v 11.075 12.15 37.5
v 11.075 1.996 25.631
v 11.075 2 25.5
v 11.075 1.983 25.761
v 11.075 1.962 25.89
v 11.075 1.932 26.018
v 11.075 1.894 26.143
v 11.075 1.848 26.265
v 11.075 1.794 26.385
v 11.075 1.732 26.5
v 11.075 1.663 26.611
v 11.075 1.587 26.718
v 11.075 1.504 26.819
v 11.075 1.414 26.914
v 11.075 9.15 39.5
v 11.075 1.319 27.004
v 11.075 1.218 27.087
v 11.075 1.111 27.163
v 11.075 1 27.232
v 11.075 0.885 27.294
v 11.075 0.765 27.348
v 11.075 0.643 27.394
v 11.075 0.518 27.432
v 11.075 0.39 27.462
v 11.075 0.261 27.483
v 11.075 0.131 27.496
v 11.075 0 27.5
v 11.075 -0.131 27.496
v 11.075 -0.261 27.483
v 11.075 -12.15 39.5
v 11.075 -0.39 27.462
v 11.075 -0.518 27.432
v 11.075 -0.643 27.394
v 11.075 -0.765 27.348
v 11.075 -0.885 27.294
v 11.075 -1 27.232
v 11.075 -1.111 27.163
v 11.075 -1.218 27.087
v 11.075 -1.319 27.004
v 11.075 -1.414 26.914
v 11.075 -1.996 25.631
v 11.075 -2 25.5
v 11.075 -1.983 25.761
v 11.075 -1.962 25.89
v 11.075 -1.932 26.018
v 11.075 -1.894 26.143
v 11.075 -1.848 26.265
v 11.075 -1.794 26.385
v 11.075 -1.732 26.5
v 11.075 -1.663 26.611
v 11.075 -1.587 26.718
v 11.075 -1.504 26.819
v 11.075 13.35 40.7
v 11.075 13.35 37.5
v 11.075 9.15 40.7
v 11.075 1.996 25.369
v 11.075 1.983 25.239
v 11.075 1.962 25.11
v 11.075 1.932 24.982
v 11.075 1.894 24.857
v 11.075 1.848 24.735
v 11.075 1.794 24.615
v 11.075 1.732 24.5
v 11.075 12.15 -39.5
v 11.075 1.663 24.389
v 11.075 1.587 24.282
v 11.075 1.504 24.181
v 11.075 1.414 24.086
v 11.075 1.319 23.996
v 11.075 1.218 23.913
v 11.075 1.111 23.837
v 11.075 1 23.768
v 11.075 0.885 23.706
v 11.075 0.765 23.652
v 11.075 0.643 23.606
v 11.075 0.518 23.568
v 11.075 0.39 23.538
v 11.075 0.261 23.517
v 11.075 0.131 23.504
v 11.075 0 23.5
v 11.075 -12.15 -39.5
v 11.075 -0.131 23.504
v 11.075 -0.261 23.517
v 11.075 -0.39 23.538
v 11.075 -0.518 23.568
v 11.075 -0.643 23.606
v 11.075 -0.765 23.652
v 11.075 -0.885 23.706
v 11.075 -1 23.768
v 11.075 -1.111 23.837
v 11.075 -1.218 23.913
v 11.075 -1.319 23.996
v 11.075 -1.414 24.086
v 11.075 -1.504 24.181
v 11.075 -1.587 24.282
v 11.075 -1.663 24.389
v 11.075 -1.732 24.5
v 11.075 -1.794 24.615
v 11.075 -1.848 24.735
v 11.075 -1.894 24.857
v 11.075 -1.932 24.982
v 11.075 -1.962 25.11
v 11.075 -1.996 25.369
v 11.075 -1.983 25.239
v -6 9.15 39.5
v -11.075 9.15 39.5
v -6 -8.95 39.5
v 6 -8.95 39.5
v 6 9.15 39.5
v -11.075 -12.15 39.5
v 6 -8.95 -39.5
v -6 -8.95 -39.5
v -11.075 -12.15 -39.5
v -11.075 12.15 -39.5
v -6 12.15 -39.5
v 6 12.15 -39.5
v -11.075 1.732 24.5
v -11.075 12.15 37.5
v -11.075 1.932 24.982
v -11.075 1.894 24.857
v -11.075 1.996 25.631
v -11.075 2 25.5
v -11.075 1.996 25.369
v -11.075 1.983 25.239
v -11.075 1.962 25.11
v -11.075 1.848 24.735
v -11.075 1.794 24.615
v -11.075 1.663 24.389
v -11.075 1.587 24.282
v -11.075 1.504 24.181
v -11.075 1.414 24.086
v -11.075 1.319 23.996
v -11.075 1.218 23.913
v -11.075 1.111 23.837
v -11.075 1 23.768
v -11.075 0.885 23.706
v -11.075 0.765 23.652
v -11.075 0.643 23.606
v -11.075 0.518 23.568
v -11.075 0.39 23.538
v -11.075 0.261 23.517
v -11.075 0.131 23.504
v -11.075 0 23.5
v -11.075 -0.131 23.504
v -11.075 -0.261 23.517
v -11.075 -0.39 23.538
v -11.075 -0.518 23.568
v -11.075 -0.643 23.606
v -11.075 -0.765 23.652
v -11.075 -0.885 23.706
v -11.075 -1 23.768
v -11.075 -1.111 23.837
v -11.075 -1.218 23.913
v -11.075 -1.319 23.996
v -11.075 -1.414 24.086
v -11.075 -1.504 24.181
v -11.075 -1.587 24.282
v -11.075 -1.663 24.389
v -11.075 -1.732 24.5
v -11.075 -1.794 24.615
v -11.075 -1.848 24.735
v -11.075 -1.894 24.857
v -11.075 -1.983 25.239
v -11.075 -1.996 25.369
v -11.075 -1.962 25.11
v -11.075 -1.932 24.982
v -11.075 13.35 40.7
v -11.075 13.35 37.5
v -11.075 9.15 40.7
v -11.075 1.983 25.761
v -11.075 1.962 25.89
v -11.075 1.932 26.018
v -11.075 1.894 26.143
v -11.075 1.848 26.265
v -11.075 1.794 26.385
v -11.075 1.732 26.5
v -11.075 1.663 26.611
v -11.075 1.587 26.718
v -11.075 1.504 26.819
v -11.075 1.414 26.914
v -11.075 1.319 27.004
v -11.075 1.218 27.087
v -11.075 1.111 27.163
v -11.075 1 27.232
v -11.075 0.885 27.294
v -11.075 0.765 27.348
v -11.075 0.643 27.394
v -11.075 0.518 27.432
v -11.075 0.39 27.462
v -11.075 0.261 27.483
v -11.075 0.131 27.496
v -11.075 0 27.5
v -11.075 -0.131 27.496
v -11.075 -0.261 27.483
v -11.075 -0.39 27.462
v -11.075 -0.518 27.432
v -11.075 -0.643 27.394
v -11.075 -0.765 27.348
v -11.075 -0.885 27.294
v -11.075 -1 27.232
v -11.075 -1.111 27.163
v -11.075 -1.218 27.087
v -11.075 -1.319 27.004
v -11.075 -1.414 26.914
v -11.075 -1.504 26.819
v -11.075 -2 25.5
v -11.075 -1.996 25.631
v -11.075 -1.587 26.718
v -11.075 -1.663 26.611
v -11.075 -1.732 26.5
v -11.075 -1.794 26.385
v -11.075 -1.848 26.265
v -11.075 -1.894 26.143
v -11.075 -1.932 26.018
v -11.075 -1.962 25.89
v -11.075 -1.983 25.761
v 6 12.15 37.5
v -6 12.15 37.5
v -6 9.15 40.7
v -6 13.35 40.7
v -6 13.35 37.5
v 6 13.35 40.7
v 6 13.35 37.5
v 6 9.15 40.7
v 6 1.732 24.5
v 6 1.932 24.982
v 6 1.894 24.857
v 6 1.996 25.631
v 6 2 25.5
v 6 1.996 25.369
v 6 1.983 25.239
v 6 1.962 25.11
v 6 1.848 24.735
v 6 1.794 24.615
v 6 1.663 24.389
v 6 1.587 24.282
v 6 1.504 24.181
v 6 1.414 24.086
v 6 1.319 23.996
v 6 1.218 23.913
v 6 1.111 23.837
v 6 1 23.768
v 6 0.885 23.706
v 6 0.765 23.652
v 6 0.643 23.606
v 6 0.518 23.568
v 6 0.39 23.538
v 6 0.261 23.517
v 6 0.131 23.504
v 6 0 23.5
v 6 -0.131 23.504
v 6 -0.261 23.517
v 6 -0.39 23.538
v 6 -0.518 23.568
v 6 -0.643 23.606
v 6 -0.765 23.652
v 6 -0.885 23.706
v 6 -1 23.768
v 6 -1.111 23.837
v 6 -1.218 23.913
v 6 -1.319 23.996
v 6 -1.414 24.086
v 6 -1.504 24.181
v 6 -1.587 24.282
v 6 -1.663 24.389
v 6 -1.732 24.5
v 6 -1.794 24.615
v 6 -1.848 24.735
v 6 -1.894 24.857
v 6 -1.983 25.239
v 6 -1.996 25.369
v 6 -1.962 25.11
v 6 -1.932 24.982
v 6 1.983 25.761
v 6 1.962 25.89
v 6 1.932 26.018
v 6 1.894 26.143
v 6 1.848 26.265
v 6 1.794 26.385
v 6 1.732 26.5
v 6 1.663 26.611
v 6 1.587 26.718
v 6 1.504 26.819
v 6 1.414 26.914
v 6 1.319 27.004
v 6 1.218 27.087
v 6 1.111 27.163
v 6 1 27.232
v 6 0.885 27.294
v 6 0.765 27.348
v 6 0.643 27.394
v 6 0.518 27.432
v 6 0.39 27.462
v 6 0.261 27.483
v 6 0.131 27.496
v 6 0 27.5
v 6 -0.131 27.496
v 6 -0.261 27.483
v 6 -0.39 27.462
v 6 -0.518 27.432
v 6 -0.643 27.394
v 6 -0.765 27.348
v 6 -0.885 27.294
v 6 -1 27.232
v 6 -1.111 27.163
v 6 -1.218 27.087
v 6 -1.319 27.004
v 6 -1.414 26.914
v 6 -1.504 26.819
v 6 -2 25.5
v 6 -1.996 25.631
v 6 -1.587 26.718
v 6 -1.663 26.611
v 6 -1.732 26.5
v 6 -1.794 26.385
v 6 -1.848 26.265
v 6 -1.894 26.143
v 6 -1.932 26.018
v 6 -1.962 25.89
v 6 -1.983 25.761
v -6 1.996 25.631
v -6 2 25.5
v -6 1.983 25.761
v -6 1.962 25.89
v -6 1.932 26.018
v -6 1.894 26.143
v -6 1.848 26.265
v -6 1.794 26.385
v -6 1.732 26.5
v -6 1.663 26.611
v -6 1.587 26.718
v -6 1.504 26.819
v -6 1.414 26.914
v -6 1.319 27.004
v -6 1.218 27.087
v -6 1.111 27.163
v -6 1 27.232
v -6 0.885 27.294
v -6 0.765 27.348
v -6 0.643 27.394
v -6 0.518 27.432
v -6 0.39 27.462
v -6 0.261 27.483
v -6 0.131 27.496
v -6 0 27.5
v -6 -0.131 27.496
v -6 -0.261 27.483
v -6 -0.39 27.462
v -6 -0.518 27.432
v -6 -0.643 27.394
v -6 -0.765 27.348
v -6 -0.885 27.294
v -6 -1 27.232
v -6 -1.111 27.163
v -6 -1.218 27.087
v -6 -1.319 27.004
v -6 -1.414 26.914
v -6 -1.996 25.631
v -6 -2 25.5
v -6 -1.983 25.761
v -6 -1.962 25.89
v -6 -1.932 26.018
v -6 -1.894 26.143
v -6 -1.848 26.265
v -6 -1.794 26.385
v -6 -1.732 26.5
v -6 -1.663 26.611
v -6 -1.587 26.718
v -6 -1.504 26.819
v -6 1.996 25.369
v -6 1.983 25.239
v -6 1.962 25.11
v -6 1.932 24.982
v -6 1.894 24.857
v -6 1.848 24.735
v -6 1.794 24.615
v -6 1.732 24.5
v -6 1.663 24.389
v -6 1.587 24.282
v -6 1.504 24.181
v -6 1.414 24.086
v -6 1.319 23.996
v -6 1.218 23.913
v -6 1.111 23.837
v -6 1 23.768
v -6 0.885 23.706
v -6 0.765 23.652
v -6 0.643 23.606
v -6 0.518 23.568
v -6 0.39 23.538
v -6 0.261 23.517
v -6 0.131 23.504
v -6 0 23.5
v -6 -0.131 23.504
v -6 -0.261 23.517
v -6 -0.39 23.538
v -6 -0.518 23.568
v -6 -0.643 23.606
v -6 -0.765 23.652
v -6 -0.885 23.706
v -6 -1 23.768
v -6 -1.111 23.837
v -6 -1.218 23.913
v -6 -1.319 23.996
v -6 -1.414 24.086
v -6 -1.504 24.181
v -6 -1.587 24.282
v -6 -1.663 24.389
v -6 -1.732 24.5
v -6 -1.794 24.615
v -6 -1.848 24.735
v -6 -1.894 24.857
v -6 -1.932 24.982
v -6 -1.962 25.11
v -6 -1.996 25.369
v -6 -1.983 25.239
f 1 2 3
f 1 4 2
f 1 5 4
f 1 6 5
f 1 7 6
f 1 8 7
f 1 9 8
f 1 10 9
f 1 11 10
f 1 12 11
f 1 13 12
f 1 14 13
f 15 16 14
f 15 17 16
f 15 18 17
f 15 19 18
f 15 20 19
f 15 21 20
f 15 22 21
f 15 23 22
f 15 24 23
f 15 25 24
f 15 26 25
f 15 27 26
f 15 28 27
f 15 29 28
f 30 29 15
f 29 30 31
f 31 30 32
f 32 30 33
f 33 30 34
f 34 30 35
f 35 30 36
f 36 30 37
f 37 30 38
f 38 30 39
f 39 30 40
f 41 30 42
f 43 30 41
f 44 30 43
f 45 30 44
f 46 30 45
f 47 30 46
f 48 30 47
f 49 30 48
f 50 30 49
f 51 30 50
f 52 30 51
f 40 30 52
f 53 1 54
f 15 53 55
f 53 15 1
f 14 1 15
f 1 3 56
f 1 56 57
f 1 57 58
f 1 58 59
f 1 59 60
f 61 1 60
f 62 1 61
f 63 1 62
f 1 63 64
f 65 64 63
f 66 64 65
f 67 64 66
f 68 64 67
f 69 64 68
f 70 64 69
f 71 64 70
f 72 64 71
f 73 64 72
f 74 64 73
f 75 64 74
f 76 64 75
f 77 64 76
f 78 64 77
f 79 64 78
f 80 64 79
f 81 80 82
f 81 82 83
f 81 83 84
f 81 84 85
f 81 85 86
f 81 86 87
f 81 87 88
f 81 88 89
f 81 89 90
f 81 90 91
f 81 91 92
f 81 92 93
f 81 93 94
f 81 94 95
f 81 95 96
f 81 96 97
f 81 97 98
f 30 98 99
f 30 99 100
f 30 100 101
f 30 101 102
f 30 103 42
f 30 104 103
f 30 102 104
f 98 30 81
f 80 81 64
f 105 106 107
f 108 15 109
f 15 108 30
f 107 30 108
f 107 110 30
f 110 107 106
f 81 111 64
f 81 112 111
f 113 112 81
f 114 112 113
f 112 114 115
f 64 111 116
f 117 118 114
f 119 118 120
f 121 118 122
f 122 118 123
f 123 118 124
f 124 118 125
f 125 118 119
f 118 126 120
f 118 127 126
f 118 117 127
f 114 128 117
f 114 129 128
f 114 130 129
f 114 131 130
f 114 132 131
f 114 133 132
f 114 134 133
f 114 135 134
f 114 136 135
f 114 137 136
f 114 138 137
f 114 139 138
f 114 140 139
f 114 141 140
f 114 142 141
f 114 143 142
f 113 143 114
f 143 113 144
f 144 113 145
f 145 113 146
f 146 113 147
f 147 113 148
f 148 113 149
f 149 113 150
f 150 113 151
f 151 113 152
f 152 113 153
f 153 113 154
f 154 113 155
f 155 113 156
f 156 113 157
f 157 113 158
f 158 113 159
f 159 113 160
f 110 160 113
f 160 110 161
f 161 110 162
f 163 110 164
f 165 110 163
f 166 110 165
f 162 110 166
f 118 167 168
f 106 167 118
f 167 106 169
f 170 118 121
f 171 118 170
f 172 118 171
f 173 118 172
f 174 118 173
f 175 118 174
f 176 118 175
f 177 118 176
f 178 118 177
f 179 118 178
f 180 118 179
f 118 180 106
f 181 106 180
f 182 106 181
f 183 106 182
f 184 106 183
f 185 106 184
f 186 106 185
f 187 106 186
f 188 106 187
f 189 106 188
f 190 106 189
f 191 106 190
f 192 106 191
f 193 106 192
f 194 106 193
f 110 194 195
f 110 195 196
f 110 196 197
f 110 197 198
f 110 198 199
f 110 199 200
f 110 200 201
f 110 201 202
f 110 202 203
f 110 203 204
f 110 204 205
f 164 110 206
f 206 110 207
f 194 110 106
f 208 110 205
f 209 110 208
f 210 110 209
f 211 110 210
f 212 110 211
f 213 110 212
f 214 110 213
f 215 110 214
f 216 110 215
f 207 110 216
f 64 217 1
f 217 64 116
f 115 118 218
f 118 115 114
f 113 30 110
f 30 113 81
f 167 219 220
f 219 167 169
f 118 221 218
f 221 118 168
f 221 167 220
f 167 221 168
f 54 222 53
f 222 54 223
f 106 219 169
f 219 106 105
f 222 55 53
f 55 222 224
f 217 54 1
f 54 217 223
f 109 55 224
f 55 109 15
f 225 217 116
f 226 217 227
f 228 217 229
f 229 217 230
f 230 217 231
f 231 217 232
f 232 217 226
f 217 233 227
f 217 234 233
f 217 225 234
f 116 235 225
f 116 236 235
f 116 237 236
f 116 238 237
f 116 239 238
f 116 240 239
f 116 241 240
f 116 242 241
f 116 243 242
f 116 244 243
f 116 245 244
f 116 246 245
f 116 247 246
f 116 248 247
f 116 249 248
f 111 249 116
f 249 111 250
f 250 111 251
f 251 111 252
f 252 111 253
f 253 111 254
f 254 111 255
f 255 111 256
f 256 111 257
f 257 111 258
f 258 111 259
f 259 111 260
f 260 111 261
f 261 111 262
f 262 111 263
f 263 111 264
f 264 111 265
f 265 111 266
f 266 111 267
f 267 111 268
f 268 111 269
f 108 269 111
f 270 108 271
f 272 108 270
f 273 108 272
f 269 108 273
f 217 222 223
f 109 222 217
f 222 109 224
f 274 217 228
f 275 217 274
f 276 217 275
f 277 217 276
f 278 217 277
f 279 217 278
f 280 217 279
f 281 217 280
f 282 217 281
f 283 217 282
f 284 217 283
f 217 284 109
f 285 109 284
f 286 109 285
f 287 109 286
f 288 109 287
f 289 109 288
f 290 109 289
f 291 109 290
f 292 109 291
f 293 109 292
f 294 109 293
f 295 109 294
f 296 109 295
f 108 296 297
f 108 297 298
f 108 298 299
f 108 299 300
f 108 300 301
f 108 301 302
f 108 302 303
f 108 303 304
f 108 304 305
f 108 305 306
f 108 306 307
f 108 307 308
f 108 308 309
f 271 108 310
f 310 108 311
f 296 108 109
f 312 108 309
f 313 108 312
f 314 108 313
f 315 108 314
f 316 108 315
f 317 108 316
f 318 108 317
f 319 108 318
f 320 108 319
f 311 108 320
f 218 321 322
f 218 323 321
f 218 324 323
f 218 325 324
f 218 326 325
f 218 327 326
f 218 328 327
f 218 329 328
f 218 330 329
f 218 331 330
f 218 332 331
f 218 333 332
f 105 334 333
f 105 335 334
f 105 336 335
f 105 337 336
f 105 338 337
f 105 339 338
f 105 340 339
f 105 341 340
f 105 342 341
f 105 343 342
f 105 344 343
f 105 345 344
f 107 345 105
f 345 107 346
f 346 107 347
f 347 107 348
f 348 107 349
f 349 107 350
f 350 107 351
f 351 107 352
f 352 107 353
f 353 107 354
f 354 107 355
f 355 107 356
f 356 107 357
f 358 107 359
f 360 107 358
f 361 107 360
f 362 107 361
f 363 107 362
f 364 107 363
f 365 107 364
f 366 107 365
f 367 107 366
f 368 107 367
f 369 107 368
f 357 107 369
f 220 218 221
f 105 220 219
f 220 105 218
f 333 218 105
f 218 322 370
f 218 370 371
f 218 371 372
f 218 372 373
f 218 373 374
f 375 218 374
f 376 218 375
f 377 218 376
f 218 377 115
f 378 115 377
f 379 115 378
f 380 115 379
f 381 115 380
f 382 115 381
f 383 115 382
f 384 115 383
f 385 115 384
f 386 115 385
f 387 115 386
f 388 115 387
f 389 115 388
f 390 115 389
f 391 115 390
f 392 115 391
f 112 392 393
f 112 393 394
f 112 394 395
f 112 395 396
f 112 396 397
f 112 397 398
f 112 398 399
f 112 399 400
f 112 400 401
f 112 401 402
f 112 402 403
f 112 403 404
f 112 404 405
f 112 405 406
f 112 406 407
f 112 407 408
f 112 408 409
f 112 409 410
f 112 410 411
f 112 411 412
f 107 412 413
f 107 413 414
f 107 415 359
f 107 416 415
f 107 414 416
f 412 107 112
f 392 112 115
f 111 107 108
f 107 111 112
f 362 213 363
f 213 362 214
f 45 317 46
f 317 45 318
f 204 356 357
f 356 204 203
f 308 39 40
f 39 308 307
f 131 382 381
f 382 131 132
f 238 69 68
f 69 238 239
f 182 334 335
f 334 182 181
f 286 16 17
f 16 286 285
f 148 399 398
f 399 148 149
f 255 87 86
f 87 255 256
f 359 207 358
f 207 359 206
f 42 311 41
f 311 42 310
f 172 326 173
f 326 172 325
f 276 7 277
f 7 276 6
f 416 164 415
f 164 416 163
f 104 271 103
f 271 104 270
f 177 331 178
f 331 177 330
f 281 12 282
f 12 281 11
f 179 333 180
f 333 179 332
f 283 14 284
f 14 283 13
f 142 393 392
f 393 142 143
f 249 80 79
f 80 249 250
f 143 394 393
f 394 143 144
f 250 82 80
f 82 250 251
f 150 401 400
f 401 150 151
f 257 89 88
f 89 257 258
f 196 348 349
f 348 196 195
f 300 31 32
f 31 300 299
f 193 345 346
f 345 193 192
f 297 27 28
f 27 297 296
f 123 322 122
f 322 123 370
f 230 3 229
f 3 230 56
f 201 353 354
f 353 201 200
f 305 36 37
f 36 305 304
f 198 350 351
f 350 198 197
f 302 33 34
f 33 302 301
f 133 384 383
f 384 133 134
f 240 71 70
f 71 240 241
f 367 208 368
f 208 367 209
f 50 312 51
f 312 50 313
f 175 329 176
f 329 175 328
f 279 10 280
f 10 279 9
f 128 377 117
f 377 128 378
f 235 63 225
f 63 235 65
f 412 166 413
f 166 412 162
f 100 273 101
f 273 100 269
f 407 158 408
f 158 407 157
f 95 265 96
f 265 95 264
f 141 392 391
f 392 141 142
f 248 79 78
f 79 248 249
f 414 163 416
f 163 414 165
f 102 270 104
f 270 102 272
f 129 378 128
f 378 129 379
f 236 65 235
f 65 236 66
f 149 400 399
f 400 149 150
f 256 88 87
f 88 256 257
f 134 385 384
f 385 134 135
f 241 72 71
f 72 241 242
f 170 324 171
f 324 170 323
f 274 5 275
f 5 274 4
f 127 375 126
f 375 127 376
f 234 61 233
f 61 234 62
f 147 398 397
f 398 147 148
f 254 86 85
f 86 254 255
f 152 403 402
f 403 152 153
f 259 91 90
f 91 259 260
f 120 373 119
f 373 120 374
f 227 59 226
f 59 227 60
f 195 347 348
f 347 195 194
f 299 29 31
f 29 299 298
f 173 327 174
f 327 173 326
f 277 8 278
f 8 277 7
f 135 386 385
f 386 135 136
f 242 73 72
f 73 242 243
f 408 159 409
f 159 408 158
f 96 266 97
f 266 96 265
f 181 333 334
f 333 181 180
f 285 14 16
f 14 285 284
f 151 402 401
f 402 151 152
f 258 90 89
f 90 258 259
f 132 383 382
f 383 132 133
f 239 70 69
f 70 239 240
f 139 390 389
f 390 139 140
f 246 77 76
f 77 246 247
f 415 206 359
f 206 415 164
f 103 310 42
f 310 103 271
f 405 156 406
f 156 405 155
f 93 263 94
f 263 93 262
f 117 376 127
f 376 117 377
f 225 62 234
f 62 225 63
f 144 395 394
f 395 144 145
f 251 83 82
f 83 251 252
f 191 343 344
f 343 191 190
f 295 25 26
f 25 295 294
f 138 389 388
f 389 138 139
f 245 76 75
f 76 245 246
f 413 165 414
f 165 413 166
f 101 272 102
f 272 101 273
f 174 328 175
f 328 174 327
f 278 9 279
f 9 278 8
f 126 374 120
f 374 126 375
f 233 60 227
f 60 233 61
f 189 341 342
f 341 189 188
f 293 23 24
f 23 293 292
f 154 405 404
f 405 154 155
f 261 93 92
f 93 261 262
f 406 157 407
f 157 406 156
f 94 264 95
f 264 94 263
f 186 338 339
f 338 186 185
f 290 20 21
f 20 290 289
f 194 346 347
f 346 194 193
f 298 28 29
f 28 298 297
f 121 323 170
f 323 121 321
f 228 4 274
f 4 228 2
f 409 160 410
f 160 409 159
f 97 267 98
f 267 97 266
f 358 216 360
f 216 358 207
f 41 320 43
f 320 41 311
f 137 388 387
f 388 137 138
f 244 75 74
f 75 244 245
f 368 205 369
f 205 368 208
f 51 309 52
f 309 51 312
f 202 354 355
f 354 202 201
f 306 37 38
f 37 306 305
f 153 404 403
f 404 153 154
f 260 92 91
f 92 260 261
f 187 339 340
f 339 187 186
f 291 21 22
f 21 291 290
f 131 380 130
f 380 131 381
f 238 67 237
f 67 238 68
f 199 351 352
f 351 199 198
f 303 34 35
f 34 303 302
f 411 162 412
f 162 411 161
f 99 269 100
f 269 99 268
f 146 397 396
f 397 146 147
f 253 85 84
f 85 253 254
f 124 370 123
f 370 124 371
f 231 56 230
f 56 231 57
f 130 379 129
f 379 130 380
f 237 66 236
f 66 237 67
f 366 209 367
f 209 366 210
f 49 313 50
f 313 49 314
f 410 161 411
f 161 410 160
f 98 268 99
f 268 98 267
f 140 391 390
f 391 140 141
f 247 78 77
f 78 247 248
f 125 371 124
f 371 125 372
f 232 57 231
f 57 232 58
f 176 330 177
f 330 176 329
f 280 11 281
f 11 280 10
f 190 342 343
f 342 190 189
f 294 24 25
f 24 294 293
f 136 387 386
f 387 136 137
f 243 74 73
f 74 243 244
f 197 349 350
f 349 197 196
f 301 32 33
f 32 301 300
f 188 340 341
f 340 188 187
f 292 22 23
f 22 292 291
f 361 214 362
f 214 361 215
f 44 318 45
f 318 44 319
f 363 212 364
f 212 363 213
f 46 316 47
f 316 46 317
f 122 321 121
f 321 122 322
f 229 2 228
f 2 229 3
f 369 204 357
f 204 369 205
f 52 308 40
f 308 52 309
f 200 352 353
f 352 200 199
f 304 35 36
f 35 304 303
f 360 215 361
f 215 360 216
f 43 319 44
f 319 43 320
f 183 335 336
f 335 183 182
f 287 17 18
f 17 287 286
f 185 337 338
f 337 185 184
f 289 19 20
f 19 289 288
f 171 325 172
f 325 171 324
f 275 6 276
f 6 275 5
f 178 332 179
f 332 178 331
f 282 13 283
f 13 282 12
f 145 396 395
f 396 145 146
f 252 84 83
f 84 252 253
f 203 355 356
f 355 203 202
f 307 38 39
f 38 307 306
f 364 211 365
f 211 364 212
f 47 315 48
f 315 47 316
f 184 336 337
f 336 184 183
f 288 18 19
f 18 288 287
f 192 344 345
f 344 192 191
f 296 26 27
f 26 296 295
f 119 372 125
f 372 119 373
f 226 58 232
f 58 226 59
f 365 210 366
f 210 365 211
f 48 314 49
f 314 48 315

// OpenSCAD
// U-shaped retaining/mounting clip with rounded back, open front channel,
// opposing side through-holes near top, and small lips at open edge.
// Bounding box target: ~22.1 x 24.3 x 79.0 mm (X x Y x Z)

$fn = 96;

// ---------------- Parameters ----------------
bbox_X = 22.15;
bbox_Y = 24.3;
bbox_Z = 79;

wall_t = 2.2;
channel_W = 14;
channel_D = 14.5;

open_gap_W = 12;

hole_d = 4;
hole_center_from_top = 14;
hole_axis_offset_from_center = 0;   // along Y

tab_len = 3;     // lip protrusion into opening (toward -Y)
tab_drop = 2;    // lip height (Z)

fillet_R_internal = 2.5;
outer_round_r = 0.9;

overlap = 1.2;   // ensure solid connections / robust booleans

// ---------------- Derived ----------------
outer_r = bbox_X/2;
inner_r = max(0.01, outer_r - wall_t);

inner_W = min(channel_W, bbox_X - 2*wall_t);
inner_D = min(channel_D, bbox_Y - 2*wall_t);

// Place rounded back so overall Y fits bbox_Y
back_cy    = -bbox_Y/2 + outer_r;
back_cy_in = back_cy + wall_t;

// Inner void rectangle center so its back aligns with inner back cylinder
inner_cy = back_cy_in + inner_D/2;

// Hole Z position (near upper region)
hole_z = bbox_Z/2 - hole_center_from_top;

// ---------------- Helpers ----------------
module rounded_rect_2d(w, h, r){
  r2 = min(r, min(w,h)/2);
  hull(){
    translate([ w/2-r2,  h/2-r2]) circle(r=r2);
    translate([-w/2+r2,  h/2-r2]) circle(r=r2);
    translate([ w/2-r2, -h/2+r2]) circle(r=r2);
    translate([-w/2+r2, -h/2+r2]) circle(r=r2);
  }
}

// Outer solid: rounded-back silhouette (rect + half-cylinder), clipped to bbox
module outer_solid(){
  intersection(){
    union(){
      cube([bbox_X, bbox_Y, bbox_Z], center=true);
      translate([0, back_cy, 0])
        cylinder(r=outer_r, h=bbox_Z + 2*overlap, center=true);
    }
    cube([bbox_X, bbox_Y, bbox_Z], center=true);
  }
}

// Inner void with generous fillets (2D minkowski then extrude)
module inner_void(){
  // Shrink base profile before Minkowski so final cavity stays within intended size
  base_W = max(0.01, inner_W - 2*fillet_R_internal);
  base_D = max(0.01, inner_D - 2*fillet_R_internal);
  base_r = max(0.01, inner_r - fillet_R_internal);

  linear_extrude(height=bbox_Z - 2*wall_t + 2*overlap, center=true, convexity=10)
    minkowski(){
      union(){
        translate([0, inner_cy])
          square([base_W, base_D], center=true);
        translate([0, back_cy_in])
          circle(r=base_r);
      }
      circle(r=fillet_R_internal);
    }
}

// Open front cut: remove material at +Y side to create U opening.
// Ensure it fully opens the mouth while preserving the rounded back.
module open_front_cut(){
  // Back-most Y of inner back cylinder = back_cy_in - inner_r
  y_back_limit = back_cy_in - inner_r;

  // Cut from just behind that limit to the front face
  y0 = y_back_limit - overlap;
  y1 = bbox_Y/2 + overlap;

  cut_len_y = (y1 - y0);
  cut_cy_y  = (y0 + y1)/2;

  translate([0, cut_cy_y, 0])
    cube([open_gap_W, cut_len_y, bbox_Z + 4*overlap], center=true);
}

// TRUE through-holes: one aligned cylinder passing through both side walls (along X)
module side_through_hole(){
  translate([0, hole_axis_offset_from_center, hole_z])
    rotate([0,90,0])
      cylinder(d=hole_d, h=bbox_X + 4*overlap, center=true);
}

// Small lips/tabs at open edge (front, +Y), one on each side of opening.
// Positioned to overlap into the side walls and top region for a single solid.
module end_tabs(){
  side_w = (bbox_X - open_gap_W)/2;

  // Place tabs so their front face is flush with bbox front, and they extend inward by tab_len.
  tab_center_y = bbox_Y/2 - tab_len/2 + overlap/2;

  // Place near the top opening edge
  tab_center_z = bbox_Z/2 - tab_drop/2 + overlap/2;

  for (sx = [-1, 1]){
    translate([
      sx*(open_gap_W/2 + side_w/2 - overlap/2),
      tab_center_y,
      tab_center_z
    ])
      cube([side_w + overlap, tab_len + overlap, tab_drop + overlap], center=true);
  }
}

// Subtle outer rounding skin (kept inside bbox)
module outer_rounding_skin(){
  intersection(){
    linear_extrude(height=bbox_Z, center=true, convexity=10)
      rounded_rect_2d(bbox_X, bbox_Y, outer_round_r);
    cube([bbox_X, bbox_Y, bbox_Z], center=true);
  }
}

// ---------------- Final ----------------
module clip(){
  difference(){
    union(){
      // Main shell with rounded back and generous internal fillets
      difference(){
        outer_solid();
        inner_void();
      }

      // Lips at the open edge (connected with overlap)
      end_tabs();

      // Subtle outer rounding
      outer_rounding_skin();
    }

    // Open the front (U opening)
    open_front_cut();

    // Aligned opposing side through-holes near top (single pass-through)
    side_through_hole();
  }
}

clip();
